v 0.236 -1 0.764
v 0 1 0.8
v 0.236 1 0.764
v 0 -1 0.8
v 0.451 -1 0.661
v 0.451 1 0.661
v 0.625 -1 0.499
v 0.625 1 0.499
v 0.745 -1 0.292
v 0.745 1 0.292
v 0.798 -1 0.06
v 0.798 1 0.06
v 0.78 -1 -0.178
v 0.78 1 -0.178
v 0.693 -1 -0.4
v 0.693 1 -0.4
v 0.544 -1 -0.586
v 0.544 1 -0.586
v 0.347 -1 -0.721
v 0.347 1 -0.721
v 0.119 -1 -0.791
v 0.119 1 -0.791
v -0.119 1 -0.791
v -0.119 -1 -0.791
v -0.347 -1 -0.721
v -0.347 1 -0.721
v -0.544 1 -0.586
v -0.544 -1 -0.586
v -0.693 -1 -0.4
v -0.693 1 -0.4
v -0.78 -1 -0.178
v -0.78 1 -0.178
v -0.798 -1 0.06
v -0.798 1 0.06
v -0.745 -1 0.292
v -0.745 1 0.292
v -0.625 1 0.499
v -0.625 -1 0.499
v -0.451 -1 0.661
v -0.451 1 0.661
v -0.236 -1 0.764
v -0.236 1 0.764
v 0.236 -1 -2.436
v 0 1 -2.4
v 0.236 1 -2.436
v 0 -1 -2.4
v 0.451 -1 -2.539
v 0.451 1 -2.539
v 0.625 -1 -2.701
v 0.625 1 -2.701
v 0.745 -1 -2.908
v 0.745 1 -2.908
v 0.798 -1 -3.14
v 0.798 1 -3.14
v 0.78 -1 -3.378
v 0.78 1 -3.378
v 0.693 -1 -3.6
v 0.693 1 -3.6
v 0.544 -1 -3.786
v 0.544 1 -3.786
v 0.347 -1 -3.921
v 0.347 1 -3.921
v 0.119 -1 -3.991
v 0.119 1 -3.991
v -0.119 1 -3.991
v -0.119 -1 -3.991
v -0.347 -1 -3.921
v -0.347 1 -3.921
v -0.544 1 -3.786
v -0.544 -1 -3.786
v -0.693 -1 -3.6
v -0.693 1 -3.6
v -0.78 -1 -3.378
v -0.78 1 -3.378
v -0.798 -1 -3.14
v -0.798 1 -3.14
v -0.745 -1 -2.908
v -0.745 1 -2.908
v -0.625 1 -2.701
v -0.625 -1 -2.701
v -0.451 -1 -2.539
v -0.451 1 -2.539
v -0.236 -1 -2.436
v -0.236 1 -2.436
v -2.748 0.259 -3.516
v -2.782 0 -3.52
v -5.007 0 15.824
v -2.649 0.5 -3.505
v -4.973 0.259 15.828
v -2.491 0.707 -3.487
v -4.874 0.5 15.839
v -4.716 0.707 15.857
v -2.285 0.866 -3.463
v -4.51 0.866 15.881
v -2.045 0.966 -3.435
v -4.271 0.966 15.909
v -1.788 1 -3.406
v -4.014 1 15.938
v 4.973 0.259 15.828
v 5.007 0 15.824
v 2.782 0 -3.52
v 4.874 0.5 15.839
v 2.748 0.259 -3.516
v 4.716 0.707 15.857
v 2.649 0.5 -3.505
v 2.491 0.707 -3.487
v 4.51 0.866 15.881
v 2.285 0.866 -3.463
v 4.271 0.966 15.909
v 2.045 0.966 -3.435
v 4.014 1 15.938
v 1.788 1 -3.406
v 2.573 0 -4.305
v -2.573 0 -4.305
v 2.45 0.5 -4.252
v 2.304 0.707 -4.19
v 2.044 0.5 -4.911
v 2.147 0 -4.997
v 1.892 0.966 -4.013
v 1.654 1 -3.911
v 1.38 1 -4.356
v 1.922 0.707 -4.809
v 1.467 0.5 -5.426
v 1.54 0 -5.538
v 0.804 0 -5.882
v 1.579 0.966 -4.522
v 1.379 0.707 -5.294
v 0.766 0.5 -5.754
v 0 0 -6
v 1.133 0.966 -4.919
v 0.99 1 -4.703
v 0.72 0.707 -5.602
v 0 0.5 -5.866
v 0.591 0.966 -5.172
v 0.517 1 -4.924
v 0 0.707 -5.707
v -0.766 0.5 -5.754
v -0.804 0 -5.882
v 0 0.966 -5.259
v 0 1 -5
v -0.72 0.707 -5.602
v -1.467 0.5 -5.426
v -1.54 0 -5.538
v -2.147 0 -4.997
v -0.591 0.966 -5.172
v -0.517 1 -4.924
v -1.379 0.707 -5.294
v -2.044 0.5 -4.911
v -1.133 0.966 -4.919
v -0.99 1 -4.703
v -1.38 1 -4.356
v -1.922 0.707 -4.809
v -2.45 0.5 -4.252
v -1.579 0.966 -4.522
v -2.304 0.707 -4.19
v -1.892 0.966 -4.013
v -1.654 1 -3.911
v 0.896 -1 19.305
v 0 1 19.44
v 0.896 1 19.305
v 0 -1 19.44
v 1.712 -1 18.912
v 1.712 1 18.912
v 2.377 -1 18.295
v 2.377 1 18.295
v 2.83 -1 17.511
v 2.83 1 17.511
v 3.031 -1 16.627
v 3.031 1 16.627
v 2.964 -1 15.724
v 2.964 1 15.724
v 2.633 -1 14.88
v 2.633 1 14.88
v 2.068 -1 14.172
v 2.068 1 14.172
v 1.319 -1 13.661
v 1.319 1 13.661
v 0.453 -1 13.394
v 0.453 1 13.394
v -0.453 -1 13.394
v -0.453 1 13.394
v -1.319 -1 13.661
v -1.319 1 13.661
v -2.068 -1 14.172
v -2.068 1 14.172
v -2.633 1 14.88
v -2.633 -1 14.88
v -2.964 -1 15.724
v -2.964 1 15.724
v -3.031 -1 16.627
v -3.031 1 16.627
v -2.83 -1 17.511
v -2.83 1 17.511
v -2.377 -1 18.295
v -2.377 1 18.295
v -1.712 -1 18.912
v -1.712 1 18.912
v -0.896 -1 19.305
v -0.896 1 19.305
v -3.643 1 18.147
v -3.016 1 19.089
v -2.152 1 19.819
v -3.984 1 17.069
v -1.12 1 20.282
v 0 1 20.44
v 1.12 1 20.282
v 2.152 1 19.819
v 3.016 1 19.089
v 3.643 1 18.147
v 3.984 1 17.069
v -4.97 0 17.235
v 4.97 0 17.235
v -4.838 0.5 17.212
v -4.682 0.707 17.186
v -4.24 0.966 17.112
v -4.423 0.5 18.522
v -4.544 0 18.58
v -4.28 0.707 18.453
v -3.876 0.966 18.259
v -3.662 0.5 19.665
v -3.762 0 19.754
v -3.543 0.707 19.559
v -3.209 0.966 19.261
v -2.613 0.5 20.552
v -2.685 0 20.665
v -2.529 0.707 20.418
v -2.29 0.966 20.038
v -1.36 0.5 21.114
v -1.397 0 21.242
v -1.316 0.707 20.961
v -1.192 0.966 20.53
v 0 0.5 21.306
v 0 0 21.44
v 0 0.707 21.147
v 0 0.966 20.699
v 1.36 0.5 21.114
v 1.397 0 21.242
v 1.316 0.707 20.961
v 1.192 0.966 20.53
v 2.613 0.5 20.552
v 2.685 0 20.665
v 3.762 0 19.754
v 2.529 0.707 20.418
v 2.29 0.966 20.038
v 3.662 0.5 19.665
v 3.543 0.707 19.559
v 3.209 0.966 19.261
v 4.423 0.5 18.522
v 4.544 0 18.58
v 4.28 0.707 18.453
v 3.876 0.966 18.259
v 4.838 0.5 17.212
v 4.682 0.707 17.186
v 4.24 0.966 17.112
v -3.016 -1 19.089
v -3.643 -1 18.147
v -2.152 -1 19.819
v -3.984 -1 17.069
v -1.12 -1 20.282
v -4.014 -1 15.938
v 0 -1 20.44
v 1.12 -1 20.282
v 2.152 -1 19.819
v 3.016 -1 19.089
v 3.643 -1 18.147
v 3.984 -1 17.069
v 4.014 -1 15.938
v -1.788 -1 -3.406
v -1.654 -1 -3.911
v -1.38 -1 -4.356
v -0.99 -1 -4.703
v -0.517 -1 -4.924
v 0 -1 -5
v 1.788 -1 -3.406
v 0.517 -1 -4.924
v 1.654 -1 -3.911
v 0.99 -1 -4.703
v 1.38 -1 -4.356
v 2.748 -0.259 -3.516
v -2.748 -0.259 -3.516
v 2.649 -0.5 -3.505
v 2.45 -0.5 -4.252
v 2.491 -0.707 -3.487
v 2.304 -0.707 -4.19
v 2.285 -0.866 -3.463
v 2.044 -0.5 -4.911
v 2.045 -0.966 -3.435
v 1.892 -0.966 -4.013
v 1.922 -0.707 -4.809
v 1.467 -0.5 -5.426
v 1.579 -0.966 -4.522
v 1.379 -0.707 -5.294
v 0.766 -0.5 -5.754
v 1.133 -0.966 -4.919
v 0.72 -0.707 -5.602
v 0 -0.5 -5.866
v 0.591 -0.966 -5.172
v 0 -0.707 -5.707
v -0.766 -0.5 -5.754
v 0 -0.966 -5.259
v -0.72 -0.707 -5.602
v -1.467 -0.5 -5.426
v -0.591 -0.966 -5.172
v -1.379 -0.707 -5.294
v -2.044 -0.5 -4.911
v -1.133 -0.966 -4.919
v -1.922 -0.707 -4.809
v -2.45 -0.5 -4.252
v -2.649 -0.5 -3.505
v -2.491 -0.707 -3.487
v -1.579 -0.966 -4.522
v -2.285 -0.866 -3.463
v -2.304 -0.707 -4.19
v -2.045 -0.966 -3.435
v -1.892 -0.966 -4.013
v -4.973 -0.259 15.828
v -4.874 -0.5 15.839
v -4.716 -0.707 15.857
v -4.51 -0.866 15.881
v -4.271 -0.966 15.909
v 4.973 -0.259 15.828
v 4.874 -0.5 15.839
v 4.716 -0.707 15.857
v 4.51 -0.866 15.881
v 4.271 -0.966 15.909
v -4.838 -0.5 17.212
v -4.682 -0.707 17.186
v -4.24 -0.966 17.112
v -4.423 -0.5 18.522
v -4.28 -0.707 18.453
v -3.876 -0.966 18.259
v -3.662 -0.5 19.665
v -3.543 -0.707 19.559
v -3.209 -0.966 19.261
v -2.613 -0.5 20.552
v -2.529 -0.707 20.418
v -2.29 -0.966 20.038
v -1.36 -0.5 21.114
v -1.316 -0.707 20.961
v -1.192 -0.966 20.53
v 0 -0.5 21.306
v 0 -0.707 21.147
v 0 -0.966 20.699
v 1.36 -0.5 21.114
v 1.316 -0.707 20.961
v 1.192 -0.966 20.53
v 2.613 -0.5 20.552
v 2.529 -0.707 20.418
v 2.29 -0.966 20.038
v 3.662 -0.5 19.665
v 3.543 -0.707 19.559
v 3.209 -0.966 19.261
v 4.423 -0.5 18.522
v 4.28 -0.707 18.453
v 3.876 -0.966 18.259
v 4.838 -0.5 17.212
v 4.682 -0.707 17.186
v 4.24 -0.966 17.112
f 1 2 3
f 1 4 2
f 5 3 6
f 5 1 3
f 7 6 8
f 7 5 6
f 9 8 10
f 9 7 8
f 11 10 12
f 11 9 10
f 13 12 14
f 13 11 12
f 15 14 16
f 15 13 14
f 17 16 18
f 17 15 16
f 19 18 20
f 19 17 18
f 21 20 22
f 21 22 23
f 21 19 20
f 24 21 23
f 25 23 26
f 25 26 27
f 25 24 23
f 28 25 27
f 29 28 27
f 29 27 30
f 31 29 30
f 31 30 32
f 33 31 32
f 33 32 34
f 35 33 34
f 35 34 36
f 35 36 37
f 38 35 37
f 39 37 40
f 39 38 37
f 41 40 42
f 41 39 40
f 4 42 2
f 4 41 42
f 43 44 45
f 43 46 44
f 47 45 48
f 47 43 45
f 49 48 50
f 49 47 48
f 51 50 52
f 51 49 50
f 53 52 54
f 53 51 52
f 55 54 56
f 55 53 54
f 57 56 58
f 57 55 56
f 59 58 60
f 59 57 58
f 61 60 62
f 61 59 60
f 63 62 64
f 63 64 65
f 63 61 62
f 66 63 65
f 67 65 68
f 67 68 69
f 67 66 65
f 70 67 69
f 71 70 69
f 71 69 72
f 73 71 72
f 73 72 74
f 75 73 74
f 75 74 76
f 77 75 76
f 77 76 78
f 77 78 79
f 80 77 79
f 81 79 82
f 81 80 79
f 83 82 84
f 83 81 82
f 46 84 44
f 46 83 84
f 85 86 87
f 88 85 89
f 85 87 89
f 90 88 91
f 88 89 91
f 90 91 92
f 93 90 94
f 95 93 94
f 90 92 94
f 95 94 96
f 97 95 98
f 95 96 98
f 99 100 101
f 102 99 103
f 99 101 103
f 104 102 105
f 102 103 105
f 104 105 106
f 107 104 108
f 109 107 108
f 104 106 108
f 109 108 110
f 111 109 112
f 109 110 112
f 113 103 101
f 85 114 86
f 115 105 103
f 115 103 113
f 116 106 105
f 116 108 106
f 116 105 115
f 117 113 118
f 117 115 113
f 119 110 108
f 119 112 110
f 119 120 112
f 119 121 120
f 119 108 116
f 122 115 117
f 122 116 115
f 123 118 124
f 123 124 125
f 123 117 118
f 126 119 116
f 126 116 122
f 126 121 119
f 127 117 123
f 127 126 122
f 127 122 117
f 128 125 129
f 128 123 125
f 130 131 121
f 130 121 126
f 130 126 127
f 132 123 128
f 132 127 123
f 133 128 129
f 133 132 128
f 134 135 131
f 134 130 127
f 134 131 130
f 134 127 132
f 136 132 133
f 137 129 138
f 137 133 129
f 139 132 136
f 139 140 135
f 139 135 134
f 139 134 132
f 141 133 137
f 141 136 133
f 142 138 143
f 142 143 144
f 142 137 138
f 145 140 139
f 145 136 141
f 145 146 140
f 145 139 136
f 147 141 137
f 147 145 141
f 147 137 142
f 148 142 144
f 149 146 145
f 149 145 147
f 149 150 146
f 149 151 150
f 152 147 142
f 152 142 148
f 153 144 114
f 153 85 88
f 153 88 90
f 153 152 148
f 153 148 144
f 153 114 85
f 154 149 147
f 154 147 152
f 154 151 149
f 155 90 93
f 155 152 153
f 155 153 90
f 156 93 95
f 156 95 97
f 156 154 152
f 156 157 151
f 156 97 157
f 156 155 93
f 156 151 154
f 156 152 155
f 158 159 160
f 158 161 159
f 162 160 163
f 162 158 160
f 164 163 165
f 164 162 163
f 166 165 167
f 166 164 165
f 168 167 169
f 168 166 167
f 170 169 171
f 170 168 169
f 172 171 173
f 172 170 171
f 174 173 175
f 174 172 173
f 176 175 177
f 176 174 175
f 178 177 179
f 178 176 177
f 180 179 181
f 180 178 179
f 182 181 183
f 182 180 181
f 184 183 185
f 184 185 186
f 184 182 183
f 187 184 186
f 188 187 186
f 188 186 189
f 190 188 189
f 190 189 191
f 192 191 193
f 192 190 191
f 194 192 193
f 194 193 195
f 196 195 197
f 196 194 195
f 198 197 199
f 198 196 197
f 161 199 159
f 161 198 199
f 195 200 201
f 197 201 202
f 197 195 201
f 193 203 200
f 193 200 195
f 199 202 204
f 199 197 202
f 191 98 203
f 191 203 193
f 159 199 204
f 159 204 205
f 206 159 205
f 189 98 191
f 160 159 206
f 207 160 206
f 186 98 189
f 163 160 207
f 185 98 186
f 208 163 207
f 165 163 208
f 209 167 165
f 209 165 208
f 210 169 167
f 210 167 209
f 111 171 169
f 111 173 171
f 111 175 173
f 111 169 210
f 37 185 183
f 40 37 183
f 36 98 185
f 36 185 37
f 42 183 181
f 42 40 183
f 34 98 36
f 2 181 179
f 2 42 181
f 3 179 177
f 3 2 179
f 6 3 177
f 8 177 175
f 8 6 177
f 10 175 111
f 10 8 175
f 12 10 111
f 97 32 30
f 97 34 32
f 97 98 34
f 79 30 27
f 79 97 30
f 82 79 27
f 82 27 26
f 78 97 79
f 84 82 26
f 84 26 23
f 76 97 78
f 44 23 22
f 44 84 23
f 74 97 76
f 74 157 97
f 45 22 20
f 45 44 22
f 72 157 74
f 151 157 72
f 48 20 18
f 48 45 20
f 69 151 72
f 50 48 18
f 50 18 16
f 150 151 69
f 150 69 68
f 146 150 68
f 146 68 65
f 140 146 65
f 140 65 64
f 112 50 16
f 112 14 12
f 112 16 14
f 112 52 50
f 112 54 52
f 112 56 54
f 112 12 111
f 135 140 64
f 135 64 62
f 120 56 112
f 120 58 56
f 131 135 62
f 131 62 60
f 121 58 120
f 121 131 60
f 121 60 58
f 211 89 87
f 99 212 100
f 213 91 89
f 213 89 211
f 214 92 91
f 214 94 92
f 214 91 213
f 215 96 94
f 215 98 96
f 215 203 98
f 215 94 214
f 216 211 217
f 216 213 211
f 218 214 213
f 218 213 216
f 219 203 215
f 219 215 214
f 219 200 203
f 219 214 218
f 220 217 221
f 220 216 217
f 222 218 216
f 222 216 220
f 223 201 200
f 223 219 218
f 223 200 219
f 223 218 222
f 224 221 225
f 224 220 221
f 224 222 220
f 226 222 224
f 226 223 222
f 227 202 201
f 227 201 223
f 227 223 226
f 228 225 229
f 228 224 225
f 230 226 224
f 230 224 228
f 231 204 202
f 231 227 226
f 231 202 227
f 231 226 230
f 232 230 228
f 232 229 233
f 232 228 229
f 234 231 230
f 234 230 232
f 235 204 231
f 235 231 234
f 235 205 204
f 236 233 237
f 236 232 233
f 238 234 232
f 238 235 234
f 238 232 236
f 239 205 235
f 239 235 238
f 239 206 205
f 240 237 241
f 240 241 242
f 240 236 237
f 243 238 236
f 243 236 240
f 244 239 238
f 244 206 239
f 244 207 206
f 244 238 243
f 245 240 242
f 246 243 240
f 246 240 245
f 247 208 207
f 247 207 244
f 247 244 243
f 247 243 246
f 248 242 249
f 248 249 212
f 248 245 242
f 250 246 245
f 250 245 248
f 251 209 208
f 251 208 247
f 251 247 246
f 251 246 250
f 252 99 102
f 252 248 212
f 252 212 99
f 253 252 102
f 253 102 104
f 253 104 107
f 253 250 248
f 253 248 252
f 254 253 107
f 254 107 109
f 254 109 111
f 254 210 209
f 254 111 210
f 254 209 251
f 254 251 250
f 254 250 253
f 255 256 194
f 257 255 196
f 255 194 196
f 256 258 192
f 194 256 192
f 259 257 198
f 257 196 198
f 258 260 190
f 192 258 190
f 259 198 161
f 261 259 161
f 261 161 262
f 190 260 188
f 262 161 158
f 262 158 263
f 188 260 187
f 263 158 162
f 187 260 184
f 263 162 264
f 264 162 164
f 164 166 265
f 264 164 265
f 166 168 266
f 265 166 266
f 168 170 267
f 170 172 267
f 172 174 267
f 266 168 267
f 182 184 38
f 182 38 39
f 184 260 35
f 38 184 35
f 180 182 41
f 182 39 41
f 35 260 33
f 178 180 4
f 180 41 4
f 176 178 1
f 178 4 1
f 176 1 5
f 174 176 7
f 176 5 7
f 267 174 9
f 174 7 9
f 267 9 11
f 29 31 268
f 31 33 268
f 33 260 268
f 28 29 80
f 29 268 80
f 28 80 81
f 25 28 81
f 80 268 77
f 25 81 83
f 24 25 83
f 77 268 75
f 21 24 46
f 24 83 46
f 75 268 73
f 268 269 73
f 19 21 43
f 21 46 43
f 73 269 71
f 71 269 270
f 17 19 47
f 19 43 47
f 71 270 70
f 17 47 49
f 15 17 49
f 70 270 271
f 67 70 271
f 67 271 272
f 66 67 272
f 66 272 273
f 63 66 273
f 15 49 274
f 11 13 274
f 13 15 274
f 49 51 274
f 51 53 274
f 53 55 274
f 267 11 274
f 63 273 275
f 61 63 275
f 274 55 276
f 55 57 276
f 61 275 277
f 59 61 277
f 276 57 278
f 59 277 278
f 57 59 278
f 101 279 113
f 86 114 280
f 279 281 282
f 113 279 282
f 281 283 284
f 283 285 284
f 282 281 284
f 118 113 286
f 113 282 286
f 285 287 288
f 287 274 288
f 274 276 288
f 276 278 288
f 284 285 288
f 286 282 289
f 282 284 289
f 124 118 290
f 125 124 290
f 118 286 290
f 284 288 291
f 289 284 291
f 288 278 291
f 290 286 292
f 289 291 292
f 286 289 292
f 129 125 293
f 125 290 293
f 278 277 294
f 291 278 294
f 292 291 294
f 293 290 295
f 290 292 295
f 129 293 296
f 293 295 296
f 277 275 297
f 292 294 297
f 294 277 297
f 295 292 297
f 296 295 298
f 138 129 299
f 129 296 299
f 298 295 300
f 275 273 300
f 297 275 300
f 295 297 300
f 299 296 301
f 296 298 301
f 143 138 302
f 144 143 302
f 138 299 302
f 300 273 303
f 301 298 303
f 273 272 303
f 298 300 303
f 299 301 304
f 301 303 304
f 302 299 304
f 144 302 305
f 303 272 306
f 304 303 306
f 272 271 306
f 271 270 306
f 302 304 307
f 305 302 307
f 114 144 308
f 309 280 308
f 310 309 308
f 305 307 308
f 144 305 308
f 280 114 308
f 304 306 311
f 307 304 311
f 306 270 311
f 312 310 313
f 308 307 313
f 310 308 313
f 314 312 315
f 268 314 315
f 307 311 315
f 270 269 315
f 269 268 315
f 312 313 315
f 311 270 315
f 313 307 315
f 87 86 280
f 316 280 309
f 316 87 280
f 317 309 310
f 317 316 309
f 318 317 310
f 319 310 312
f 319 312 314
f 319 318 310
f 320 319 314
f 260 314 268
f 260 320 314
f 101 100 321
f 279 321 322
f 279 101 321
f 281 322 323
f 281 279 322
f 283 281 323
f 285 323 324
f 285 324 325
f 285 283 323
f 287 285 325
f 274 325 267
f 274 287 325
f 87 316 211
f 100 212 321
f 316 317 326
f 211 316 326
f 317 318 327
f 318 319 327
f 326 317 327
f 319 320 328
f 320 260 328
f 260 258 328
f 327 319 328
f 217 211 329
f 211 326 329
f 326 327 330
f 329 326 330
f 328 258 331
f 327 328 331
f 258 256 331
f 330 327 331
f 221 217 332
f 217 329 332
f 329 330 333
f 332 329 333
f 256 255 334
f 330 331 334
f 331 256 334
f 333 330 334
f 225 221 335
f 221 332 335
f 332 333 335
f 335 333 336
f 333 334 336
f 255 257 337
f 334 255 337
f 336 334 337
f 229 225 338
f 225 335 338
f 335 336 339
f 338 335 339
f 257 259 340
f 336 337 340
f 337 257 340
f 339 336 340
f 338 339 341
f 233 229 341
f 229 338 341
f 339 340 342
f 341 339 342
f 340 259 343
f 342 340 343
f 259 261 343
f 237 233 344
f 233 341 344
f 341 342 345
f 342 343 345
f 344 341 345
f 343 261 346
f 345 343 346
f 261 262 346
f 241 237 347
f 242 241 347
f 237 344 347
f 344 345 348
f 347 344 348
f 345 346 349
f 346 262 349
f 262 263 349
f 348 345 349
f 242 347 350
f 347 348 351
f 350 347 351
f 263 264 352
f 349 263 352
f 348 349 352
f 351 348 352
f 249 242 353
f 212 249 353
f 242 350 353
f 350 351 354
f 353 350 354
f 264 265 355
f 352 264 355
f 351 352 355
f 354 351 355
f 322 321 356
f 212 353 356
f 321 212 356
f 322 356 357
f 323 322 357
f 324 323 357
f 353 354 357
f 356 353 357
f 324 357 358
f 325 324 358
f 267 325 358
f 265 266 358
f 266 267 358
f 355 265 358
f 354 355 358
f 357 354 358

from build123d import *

# Parameters (mm, degrees)
CROQUIS2_R              = 0.8
CROQUIS2_R_2            = 3.04
SALIENTE_EXTRUIR1_DEPTH = 1
REDONDEO1_R             = 1


with BuildPart() as part:
    # Croquis2 → Saliente-Extruir1 (new, symmetric)
    with BuildSketch(Plane(origin=(0, 0, 0), x_dir=(1, 0, 0), z_dir=(0, 1, 0))):
        with BuildLine():
            Line((-2.781654184, 3.52), (-5.006977531, -15.824))
            ThreePointArc((-5.006977531, -15.824), (0, -21.44), (5.006977531, -15.824))
            Line((5.006977531, -15.824), (2.781654184, 3.52))
            ThreePointArc((2.781654184, 3.52), (0, 6), (-2.781654184, 3.52))
        make_face()
        with Locations(Location((0, 0, 0), (0, 0, 270))):
            Circle(CROQUIS2_R, mode=Mode.SUBTRACT)
        with Locations(Location((0, 3.2, 0), (0, 0, 270))):
            Circle(CROQUIS2_R, mode=Mode.SUBTRACT)
        with Locations(Location((0, -16.4, 0), (0, 0, 270))):
            Circle(CROQUIS2_R_2, mode=Mode.SUBTRACT)
    extrude(amount=SALIENTE_EXTRUIR1_DEPTH, both=True)

    # Redondeo1
    redondeo1_edges = [part.edges().sort_by_distance(p)[0] for p in [
        (-3.894315858, -1, 6.152),
        (0, -1, -6),
        (3.894315858, -1, 6.152),
        (-3.894315858, 1, 6.152),
        (0, 1, -6),
        (3.894315858, 1, 6.152),
        (0, -1, 21.44),
        (0, 1, 21.44),
    ]]
    fillet(redondeo1_edges, radius=REDONDEO1_R - 0.0001)  # a hair under: the kernel refuses the full size


solid = part.part
